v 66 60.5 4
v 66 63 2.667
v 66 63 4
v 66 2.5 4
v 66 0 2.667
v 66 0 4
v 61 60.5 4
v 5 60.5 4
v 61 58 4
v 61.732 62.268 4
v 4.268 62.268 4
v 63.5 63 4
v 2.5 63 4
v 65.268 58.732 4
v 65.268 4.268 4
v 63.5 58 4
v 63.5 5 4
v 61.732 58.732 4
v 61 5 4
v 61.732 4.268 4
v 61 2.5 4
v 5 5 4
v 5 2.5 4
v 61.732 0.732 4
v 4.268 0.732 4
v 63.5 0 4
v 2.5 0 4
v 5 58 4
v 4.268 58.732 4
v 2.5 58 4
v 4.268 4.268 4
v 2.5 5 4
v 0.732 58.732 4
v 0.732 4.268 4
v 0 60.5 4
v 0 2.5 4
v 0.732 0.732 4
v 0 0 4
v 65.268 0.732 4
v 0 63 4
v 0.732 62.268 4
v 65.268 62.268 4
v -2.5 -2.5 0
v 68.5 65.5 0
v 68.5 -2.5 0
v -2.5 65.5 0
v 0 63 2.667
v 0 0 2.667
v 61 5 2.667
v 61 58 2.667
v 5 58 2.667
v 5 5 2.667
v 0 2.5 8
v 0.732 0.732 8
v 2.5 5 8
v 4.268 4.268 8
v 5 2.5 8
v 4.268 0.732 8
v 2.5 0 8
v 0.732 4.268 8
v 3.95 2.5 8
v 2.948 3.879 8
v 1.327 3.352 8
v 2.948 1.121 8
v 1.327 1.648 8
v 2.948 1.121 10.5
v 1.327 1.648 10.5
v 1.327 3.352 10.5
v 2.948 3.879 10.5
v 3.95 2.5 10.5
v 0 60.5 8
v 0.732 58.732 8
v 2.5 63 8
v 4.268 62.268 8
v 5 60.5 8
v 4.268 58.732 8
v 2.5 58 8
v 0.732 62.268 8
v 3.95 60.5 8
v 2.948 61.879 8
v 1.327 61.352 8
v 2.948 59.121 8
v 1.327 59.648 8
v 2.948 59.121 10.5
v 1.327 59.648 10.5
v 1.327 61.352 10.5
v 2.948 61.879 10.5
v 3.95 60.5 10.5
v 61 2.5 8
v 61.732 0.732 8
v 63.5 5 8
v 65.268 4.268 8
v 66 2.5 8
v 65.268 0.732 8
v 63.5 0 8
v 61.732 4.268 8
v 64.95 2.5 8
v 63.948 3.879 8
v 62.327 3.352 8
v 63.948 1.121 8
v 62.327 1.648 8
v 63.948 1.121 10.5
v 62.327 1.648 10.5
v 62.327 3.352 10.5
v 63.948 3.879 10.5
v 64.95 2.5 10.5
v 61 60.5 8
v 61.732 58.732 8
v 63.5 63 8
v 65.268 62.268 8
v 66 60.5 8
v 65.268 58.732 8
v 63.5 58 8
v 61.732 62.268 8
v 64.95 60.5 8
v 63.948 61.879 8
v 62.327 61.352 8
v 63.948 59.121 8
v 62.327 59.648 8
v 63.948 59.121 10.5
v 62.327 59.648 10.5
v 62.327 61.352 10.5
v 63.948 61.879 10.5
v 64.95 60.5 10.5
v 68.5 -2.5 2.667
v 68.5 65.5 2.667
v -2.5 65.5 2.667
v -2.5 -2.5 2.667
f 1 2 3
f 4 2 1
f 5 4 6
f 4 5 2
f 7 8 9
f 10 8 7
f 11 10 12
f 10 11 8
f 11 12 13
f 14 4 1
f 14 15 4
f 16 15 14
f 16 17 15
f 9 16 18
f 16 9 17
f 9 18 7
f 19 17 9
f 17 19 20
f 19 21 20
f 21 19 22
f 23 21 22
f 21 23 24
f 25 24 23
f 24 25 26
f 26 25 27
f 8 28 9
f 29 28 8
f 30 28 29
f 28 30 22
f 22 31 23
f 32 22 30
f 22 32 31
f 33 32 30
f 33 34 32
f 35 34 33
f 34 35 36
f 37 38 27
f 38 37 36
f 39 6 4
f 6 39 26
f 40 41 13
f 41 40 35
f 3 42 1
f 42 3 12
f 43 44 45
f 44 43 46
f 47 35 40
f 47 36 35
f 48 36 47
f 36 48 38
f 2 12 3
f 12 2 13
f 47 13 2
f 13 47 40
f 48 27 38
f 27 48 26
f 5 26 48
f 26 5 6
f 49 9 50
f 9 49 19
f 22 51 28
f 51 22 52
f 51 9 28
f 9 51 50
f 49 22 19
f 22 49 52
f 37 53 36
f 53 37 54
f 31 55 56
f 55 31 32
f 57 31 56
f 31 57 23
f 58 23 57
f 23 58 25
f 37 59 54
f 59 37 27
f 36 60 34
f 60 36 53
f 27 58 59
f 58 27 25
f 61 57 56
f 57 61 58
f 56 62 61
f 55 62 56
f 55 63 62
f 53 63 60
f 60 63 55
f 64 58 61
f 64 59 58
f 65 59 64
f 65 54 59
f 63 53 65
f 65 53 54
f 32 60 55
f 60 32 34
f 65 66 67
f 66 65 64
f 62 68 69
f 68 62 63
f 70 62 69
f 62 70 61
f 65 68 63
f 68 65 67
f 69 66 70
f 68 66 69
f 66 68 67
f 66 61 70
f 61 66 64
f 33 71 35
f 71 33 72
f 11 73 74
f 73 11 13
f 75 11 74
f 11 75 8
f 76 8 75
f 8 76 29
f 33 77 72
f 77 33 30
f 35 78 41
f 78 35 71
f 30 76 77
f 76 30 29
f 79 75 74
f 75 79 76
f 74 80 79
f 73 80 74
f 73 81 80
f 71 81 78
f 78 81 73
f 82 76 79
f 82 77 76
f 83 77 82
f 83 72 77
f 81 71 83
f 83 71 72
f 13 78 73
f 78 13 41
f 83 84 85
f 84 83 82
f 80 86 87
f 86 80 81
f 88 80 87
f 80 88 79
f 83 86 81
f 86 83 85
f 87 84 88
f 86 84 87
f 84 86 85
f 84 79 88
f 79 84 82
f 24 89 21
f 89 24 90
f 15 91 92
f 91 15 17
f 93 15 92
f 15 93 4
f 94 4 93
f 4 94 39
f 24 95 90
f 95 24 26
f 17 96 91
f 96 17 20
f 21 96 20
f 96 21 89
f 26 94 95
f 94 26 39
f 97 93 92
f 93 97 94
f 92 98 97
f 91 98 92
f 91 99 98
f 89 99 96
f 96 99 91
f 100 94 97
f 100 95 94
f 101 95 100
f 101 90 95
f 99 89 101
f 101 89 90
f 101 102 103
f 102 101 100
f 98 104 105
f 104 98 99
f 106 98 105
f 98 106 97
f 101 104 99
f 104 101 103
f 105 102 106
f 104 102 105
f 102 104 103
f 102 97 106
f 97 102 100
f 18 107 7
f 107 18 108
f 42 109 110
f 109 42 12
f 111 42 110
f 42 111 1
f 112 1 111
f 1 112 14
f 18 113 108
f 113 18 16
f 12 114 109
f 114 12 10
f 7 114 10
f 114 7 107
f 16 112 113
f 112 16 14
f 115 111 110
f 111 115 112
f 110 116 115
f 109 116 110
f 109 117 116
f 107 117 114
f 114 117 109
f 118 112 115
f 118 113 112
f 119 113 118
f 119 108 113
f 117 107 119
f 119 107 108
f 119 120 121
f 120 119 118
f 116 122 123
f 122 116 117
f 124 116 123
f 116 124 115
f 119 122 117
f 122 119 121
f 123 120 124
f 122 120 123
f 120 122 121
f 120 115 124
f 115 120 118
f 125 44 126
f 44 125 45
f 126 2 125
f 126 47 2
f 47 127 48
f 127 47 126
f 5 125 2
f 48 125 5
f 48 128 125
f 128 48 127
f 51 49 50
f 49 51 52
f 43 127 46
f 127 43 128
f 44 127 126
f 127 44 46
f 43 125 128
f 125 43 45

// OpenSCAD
module bottom() {
    base_height = 4;
    base_width = 66;
    base_depth = 63;

    cylinder_height = 4;
    cylinder_dia = 5;
    cylinder_dia_small = 2.9;

    difference() {
        cube([base_width, base_depth, base_height]);
        translate([5, 5, 2]) {
            cube([base_width - 10, base_depth - 10, 3]);
        }
    }

    translate([2.5, 2.5, base_height]) {
        cylinder(h=cylinder_height, d=cylinder_dia);
        cylinder(h=cylinder_height + 2.5, d=cylinder_dia_small);
    }
    translate([2.5, base_depth - 2.5, base_height]) {
        cylinder(h=cylinder_height, d=cylinder_dia);
        cylinder(h=cylinder_height + 2.5, d=cylinder_dia_small);
    }

    translate([base_width - 2.5, 2.5, base_height]) {
        cylinder(h=cylinder_height, d=cylinder_dia);
        cylinder(h=cylinder_height + 2.5, d=cylinder_dia_small);
    }

    translate([base_width - 2.5,base_depth - 2.5, base_height]) {
        cylinder(h=cylinder_height, d=cylinder_dia);
        cylinder(h=cylinder_height + 2.5, d=cylinder_dia_small);
    }
    
    translate([-2.5, -2.5, 0]) {
        cube([base_width + 5, base_depth + 5, base_height / 1.5]);
    }
}

bottom();
